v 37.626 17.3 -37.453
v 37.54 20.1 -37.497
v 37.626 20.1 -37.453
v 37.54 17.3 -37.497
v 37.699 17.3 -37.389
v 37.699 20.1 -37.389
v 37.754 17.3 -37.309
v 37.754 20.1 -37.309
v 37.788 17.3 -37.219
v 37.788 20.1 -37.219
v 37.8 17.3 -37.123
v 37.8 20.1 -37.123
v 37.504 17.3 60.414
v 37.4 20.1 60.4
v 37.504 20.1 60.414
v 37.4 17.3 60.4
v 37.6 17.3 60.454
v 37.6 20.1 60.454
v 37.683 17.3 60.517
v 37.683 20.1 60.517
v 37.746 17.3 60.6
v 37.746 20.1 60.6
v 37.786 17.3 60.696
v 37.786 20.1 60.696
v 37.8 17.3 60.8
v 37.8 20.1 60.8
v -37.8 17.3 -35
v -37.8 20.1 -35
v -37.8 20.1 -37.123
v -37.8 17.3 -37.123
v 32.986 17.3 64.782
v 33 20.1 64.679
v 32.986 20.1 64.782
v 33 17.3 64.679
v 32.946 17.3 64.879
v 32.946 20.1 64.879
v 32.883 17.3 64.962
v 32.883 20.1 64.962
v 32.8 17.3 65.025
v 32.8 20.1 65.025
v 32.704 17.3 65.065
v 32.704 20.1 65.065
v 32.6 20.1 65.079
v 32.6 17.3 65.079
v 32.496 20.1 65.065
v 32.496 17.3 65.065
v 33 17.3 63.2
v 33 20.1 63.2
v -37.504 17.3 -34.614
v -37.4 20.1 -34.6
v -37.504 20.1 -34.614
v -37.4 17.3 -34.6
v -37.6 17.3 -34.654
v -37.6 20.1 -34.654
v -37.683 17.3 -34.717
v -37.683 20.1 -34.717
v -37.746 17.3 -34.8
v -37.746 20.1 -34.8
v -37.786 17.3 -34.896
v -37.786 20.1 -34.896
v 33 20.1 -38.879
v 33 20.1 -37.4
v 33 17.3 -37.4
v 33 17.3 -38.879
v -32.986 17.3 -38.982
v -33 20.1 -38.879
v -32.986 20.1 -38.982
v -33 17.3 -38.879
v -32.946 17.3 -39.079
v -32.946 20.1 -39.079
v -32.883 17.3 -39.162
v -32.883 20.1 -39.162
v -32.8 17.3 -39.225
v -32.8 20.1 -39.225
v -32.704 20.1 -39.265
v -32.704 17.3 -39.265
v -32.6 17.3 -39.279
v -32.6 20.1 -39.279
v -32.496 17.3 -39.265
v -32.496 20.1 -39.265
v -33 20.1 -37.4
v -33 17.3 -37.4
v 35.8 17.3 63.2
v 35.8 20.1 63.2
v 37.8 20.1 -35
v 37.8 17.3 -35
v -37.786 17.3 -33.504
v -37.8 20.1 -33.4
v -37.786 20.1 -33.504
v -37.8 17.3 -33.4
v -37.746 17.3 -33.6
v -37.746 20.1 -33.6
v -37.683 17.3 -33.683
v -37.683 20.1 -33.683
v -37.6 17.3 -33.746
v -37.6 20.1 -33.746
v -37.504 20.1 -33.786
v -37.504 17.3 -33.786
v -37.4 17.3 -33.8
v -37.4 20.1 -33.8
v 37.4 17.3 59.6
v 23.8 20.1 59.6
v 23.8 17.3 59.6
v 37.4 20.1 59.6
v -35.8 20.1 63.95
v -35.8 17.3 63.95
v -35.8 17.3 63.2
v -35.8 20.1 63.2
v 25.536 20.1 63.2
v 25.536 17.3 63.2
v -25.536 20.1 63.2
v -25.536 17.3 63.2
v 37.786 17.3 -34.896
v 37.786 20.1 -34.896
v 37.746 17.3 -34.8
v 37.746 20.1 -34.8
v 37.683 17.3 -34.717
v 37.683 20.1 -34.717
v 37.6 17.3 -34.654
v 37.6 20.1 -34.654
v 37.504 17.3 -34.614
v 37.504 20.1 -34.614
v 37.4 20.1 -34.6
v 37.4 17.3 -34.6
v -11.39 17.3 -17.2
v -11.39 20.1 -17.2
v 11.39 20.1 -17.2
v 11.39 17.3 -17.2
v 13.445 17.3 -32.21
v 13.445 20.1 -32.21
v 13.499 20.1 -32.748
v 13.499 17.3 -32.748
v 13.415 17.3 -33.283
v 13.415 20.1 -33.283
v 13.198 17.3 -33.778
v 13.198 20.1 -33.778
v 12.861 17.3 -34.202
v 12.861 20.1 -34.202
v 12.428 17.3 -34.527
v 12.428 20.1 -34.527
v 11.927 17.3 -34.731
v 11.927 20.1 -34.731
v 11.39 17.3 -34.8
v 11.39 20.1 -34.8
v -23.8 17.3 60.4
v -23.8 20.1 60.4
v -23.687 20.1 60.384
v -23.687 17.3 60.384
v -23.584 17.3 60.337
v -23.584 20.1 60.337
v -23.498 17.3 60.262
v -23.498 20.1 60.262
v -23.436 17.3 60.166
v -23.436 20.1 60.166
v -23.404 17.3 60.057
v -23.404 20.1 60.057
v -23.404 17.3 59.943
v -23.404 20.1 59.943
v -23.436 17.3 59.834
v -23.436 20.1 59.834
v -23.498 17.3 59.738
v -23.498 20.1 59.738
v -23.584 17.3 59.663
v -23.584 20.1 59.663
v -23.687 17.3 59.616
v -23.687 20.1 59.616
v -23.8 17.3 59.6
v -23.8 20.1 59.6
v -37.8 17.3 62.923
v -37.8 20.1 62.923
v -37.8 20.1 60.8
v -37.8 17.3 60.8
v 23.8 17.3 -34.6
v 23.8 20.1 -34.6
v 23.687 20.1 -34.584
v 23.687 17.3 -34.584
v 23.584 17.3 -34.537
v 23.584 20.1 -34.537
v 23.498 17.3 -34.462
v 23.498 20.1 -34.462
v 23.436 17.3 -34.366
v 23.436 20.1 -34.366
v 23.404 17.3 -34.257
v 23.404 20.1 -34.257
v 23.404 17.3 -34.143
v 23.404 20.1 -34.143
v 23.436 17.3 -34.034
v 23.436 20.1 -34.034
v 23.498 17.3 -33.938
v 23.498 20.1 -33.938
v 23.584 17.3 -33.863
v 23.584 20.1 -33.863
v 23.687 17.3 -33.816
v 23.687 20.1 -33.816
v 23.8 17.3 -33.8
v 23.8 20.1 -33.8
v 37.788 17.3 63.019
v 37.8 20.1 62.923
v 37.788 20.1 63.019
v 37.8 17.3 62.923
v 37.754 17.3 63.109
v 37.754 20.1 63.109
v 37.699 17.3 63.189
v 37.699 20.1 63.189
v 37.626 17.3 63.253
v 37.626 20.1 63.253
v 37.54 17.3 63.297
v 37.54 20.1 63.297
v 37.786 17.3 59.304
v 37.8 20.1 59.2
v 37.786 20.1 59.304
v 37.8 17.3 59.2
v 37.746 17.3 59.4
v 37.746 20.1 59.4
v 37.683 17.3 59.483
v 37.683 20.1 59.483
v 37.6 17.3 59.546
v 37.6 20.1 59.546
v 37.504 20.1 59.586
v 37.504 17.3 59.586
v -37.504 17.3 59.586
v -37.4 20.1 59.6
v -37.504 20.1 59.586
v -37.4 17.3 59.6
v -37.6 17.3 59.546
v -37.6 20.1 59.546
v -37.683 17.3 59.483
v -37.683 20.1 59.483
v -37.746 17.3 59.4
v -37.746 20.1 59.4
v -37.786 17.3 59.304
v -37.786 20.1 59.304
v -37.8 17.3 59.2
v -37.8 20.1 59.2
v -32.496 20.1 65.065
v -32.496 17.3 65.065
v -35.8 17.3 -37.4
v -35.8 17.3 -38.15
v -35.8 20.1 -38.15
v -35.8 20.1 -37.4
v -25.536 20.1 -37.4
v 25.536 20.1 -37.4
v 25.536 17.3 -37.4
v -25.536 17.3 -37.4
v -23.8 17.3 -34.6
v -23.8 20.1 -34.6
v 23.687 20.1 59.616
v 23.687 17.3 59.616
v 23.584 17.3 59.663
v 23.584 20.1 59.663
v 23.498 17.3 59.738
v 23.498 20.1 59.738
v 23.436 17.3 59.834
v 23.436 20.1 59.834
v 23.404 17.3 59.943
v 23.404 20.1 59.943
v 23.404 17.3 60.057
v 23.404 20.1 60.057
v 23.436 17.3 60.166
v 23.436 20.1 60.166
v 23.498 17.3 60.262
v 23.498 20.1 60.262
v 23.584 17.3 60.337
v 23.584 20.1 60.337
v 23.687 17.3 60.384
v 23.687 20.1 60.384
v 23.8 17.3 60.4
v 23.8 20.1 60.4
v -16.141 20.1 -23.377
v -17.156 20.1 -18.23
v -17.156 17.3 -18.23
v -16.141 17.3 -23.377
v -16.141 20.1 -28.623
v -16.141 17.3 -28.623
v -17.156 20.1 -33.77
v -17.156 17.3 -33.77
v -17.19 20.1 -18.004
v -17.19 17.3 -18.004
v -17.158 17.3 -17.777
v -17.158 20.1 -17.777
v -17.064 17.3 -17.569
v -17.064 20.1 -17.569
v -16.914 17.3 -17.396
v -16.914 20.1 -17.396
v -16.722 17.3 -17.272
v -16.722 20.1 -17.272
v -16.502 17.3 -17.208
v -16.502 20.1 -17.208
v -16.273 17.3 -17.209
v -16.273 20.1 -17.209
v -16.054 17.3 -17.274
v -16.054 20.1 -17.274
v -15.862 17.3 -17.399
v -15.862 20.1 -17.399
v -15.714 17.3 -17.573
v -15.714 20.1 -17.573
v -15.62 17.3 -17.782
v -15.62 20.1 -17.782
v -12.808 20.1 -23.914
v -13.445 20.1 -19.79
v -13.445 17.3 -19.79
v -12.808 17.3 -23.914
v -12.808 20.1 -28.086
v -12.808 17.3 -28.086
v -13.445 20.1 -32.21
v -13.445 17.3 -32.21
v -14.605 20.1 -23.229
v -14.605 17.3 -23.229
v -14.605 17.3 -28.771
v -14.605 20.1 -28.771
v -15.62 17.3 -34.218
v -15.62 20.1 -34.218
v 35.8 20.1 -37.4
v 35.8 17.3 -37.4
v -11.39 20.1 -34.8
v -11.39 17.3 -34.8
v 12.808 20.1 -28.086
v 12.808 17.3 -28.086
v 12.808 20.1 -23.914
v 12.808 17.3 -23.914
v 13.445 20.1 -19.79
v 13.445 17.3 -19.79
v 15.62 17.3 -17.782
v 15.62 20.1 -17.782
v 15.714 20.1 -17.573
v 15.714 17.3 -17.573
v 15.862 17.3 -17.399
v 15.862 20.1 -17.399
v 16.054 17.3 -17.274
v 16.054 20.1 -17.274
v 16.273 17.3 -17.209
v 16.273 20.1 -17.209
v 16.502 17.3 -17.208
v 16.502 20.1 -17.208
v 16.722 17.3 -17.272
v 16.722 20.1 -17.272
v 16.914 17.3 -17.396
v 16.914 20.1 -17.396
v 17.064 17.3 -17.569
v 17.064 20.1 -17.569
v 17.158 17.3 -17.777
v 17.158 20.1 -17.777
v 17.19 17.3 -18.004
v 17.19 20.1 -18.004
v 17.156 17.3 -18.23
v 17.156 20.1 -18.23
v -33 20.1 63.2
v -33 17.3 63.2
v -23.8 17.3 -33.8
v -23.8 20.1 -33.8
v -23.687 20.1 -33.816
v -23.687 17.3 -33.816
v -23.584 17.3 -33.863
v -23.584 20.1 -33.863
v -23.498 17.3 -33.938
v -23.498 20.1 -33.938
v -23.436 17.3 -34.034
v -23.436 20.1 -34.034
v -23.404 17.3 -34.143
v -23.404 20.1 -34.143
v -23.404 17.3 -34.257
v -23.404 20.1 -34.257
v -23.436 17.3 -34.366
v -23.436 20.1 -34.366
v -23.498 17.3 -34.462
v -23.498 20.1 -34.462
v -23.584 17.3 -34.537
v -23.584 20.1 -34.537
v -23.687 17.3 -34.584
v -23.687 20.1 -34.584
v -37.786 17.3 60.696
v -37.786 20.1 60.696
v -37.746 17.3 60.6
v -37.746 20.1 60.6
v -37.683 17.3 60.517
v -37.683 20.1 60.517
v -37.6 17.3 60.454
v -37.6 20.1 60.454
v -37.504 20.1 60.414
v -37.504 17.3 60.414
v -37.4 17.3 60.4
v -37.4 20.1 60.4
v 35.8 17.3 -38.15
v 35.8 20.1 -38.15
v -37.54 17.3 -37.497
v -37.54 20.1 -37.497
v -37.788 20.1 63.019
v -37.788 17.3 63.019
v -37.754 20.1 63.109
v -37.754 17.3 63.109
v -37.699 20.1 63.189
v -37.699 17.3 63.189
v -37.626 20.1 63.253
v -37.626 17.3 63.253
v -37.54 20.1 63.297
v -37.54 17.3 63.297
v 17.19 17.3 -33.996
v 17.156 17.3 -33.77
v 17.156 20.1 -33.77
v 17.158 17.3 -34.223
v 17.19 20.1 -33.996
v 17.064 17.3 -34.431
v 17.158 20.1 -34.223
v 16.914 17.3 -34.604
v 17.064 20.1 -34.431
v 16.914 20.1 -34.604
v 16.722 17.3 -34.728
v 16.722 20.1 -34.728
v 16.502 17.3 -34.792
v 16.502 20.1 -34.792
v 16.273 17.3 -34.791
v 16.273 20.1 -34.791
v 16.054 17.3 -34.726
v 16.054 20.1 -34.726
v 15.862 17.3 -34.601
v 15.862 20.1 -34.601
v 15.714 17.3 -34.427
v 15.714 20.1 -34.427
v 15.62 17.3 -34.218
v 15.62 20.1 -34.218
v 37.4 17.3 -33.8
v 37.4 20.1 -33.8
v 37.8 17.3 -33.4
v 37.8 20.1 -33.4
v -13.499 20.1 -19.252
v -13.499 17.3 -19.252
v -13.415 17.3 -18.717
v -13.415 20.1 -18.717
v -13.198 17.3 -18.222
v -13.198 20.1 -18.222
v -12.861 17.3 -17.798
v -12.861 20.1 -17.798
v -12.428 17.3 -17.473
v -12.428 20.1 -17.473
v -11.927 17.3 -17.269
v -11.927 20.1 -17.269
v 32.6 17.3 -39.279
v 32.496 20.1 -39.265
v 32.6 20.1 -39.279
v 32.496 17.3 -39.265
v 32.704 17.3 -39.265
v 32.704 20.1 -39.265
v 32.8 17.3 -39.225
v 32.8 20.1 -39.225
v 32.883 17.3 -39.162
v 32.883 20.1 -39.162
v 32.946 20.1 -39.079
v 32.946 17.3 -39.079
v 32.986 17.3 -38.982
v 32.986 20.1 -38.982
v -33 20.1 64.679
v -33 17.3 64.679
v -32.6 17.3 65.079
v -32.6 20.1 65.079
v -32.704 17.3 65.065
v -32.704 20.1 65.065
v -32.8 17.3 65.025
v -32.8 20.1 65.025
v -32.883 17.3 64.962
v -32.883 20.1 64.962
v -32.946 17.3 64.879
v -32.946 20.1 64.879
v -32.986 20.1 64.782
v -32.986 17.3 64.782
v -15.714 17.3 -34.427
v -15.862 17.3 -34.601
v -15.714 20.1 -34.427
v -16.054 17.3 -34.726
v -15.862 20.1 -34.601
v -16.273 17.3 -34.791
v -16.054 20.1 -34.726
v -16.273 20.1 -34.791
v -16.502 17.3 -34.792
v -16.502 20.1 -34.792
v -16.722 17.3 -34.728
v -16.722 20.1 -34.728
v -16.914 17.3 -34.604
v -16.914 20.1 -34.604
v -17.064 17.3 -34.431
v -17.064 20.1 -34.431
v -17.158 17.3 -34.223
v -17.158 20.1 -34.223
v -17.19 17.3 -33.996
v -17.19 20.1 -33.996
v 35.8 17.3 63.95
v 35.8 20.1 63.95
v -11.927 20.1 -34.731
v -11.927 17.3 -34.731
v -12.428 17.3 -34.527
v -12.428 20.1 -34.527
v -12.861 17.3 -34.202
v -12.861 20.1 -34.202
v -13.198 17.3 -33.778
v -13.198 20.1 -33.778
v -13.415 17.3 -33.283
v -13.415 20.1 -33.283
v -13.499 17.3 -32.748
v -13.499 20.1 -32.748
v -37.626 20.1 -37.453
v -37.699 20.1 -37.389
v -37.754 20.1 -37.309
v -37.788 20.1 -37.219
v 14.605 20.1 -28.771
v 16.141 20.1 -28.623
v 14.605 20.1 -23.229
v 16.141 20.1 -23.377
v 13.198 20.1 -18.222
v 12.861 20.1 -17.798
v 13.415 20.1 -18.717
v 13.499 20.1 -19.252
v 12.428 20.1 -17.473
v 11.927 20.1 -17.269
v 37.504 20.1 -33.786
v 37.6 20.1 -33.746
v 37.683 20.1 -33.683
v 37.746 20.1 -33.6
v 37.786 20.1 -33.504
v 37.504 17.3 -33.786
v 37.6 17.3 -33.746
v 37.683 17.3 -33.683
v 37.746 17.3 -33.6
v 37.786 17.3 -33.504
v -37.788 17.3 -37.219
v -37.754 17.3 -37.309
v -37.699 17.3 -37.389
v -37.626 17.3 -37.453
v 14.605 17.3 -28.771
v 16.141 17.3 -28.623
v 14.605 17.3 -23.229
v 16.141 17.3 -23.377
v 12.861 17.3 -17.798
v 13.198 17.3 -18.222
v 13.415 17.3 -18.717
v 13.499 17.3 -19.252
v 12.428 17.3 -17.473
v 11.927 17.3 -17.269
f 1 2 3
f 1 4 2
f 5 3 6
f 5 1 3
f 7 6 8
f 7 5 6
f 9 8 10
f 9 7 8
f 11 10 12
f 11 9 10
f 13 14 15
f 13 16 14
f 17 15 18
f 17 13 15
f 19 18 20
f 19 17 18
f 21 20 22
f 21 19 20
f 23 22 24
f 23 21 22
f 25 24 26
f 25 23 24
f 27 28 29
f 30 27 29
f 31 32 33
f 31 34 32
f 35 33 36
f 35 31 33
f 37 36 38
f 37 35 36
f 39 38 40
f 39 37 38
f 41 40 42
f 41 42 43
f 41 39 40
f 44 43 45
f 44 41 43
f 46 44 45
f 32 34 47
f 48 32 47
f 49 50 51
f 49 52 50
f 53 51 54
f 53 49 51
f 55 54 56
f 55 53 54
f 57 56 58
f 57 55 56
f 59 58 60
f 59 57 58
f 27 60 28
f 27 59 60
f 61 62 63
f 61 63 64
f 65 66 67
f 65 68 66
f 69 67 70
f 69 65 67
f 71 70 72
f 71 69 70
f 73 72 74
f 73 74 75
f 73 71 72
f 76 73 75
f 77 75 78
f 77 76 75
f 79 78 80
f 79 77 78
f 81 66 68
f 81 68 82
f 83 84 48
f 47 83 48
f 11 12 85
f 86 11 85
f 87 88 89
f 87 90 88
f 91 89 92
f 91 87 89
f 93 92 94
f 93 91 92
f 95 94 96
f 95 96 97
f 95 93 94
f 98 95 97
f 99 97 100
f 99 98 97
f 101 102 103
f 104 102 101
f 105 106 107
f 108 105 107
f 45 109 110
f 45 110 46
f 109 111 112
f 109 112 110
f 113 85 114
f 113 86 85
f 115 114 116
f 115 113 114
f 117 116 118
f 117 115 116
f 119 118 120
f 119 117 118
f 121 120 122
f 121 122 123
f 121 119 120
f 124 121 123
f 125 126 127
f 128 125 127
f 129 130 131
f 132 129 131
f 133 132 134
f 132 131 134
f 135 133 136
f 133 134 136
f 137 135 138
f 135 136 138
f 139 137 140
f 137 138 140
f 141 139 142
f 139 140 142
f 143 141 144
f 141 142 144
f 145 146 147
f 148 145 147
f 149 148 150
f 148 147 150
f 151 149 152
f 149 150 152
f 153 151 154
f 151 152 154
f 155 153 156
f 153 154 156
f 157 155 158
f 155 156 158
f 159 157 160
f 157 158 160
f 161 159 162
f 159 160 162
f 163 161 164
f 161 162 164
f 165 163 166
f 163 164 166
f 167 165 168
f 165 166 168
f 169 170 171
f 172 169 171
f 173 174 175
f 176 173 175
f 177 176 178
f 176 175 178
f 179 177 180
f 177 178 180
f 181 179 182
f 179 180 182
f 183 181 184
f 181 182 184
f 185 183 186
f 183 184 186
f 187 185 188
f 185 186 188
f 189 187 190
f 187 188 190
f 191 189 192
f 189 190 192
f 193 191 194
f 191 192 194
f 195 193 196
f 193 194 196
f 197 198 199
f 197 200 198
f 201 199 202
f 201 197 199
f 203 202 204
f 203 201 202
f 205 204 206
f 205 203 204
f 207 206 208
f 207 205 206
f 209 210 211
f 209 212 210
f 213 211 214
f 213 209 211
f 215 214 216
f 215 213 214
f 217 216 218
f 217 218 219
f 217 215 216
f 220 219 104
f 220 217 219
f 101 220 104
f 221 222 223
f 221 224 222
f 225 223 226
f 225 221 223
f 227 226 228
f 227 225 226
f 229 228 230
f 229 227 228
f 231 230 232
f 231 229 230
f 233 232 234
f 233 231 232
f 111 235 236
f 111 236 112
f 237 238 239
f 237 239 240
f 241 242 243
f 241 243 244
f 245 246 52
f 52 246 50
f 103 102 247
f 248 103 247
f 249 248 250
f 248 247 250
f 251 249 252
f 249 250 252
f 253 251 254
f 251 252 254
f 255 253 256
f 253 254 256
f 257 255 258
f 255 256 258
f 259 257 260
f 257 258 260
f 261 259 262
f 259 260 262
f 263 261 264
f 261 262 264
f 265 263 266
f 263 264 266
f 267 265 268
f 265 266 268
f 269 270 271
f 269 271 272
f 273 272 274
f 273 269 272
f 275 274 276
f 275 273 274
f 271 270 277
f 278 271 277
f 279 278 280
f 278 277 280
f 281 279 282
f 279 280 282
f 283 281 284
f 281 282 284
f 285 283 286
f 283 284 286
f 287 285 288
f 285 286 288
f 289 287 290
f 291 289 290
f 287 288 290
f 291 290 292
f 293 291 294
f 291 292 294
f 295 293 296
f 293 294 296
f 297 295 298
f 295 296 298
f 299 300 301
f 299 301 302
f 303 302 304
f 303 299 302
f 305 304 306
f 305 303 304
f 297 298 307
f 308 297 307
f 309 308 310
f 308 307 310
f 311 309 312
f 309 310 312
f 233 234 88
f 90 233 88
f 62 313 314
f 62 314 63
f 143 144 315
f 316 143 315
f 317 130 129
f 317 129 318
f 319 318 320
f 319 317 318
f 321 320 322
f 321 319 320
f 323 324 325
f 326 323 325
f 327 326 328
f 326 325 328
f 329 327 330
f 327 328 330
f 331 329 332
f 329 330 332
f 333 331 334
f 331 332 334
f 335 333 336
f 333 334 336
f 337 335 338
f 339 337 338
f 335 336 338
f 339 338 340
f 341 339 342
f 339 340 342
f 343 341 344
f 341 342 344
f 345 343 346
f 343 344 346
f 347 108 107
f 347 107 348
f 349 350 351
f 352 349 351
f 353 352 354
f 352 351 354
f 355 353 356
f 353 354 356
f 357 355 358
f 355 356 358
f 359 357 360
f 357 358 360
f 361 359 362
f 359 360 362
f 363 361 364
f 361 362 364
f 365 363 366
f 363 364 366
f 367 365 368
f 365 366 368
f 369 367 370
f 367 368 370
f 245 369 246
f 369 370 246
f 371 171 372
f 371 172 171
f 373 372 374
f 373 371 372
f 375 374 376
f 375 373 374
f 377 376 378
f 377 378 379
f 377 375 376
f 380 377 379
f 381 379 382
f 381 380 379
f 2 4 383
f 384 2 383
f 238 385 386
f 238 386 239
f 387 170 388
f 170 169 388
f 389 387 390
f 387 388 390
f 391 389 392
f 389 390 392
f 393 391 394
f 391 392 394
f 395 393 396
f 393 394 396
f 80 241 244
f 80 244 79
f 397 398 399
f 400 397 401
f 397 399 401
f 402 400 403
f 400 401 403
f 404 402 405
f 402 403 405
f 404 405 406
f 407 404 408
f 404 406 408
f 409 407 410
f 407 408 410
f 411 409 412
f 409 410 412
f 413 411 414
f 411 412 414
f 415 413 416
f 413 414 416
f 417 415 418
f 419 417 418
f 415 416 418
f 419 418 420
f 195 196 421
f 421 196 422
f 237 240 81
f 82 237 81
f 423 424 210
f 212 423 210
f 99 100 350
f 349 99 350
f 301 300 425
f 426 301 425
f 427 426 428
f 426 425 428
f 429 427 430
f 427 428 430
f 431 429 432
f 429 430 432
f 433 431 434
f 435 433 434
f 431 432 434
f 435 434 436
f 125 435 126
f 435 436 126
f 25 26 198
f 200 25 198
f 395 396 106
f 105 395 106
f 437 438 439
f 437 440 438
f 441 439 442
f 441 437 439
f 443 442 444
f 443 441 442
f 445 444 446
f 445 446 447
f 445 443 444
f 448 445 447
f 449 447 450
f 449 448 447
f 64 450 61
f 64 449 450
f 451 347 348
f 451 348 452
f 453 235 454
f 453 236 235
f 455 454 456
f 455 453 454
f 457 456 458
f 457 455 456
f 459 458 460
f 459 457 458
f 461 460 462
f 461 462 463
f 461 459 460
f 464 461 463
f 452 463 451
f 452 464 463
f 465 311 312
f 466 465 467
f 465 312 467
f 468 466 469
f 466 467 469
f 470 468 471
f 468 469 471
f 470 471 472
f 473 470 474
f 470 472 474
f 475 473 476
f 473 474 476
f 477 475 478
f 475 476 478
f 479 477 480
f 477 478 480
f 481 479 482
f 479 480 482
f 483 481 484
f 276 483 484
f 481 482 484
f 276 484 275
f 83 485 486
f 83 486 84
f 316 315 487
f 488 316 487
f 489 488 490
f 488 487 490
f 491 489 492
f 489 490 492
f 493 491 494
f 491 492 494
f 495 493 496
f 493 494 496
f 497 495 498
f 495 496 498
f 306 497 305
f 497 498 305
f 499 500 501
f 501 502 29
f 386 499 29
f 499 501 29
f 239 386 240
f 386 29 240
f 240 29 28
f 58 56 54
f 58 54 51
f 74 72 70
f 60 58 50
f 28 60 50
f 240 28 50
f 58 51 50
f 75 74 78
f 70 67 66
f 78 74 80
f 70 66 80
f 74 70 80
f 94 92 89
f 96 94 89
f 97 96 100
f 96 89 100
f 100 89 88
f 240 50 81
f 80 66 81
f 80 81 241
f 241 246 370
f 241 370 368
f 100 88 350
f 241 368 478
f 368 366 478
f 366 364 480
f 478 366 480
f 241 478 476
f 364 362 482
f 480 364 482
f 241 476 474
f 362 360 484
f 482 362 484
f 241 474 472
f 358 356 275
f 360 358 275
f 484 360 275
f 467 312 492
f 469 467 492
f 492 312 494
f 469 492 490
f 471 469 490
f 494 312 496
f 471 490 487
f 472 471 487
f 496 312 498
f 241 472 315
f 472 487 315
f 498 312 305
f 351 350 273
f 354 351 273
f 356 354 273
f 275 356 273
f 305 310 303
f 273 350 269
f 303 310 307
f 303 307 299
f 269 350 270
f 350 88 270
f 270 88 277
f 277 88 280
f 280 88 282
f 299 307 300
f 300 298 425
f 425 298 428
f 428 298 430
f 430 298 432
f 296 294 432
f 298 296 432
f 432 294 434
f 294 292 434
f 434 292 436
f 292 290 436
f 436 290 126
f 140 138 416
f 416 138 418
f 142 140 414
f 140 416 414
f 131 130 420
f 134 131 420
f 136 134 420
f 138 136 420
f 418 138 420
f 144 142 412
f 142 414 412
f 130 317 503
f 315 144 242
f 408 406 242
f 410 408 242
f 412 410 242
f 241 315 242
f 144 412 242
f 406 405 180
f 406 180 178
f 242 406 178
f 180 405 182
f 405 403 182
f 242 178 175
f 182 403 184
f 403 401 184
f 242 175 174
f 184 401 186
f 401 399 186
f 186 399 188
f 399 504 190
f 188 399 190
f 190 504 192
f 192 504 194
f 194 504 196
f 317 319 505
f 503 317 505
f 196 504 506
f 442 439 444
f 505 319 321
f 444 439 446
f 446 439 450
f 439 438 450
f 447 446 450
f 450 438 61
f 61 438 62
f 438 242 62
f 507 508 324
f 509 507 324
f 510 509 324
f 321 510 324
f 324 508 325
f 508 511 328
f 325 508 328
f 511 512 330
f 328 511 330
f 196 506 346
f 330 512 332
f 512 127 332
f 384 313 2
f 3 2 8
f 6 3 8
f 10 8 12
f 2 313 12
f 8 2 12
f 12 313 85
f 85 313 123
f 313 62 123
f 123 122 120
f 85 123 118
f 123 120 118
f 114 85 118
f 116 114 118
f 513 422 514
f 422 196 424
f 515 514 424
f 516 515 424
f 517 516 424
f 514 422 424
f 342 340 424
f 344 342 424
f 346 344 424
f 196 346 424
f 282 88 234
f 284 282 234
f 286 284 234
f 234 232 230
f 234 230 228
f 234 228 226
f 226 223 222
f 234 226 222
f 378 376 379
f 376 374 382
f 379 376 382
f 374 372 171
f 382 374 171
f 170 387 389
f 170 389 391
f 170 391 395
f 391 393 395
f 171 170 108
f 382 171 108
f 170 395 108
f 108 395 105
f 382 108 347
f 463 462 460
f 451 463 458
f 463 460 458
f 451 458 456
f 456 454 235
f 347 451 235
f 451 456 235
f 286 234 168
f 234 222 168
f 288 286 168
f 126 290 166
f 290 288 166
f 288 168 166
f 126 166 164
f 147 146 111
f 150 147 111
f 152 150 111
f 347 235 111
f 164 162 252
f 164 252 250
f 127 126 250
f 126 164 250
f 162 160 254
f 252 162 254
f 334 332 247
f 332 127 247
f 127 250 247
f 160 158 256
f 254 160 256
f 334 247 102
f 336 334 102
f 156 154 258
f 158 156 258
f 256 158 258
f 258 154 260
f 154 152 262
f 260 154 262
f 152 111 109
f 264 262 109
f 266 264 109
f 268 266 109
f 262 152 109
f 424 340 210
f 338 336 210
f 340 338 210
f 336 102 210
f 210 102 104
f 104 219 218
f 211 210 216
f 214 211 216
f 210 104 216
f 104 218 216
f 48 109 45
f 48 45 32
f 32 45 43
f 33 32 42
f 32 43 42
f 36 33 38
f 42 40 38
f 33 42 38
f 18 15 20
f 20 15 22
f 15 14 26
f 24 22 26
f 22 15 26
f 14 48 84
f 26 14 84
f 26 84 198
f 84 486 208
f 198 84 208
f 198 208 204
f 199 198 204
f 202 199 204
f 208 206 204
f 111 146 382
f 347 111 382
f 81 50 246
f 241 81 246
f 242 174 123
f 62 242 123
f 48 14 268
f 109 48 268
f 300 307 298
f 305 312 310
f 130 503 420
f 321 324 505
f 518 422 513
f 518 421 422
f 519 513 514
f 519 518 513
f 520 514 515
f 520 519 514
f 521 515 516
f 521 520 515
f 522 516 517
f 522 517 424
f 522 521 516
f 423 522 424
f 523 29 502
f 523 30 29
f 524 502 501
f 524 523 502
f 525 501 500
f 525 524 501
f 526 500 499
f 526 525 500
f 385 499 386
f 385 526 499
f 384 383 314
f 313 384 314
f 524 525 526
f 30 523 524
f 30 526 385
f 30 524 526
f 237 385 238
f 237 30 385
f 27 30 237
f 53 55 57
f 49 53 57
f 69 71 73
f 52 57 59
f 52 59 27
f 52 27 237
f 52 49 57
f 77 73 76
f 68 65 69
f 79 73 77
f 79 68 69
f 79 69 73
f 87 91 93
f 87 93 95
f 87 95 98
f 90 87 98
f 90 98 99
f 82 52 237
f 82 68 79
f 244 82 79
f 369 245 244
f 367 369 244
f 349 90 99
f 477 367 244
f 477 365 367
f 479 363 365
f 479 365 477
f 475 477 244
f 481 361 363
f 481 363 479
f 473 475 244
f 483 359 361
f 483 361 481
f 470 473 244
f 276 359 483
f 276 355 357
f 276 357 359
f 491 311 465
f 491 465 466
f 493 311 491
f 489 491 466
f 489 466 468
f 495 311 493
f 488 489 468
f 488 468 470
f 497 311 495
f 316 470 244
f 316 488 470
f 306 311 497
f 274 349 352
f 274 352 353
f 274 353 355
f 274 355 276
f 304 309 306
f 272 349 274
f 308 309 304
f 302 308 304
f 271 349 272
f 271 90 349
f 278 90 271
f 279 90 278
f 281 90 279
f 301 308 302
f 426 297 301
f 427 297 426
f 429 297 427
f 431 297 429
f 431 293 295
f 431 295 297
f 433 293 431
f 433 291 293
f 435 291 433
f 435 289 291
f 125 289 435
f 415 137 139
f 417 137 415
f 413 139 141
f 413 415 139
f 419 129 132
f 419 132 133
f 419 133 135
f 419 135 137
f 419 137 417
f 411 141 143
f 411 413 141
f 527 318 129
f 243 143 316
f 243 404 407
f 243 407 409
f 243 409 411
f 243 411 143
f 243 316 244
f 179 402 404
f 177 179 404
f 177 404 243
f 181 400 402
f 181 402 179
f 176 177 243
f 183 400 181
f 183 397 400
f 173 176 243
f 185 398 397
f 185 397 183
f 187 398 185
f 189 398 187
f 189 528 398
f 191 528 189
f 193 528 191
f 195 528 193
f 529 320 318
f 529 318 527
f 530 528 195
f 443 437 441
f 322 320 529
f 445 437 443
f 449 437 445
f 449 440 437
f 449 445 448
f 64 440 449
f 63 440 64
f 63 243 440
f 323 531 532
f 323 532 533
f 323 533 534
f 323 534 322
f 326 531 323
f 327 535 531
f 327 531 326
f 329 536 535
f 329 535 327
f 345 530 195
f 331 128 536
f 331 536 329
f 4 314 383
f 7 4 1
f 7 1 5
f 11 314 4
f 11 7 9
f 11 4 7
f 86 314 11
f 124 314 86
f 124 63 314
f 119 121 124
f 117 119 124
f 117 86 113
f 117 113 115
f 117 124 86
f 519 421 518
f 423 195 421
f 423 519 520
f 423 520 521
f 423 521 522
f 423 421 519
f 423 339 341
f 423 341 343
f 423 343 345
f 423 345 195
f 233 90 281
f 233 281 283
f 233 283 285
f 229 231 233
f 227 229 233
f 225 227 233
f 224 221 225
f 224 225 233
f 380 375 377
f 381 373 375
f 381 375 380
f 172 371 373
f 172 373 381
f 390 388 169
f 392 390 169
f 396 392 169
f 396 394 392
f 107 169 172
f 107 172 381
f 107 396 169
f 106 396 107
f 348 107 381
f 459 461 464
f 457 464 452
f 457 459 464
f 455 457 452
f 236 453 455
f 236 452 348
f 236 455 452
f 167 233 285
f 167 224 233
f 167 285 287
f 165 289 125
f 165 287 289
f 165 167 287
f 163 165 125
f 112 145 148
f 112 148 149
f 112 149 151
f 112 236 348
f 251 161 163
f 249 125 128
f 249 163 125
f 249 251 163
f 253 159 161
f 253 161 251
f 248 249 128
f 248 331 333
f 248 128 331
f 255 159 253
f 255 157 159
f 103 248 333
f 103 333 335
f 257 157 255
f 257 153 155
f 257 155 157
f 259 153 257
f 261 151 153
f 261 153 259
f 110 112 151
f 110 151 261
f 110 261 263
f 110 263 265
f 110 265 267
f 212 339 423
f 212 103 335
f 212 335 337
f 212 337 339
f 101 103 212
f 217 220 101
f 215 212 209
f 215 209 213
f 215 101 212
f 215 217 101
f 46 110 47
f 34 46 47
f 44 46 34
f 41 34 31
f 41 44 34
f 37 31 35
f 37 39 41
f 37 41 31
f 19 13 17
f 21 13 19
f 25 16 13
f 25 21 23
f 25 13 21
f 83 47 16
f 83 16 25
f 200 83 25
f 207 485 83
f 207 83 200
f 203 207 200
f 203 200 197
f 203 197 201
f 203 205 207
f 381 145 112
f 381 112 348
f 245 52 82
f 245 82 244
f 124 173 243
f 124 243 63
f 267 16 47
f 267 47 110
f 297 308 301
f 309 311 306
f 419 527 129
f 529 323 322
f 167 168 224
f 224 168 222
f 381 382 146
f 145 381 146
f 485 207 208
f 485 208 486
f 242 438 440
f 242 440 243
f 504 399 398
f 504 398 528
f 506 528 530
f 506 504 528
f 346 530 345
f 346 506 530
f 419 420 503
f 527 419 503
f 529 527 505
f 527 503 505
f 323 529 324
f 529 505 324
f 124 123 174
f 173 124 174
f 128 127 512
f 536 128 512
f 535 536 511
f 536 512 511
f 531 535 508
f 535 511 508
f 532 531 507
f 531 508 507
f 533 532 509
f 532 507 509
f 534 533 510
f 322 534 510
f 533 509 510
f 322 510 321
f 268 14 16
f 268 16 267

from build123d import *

# Parameters (mm, degrees)
PAD008_DEPTH = 2.8
FILLET001_R  = 0.4
POCKET_DEPTH = 2.801


with BuildPart() as part:
    # Sketch008 (on Face4 of ShapeBinder007) → Pad008 (new body)
    with BuildSketch(Plane(origin=(0, 20.1, 0), x_dir=(-1, 0, 0), z_dir=(0, 1, 0))):
        with BuildLine():
            Line((37.8, 63.2), (37.8, 60.4))
            Line((37.8, 60.4), (23.8, 60.4))
            ThreePointArc((23.8, 60.4), (23.4, 60), (23.8, 59.6))
            Line((23.8, 59.6), (37.8, 59.6))
            Line((37.8, 59.6), (37.8, -33.8))
            Line((37.8, -33.8), (23.8, -33.8))
            ThreePointArc((23.8, -33.8), (23.4, -34.2), (23.8, -34.6))
            Line((23.8, -34.6), (37.8, -34.6))
            Line((37.8, -34.6), (37.8, -37.4))
            Line((37.8, -37.4), (35.8, -38.15))
            Line((35.8, -38.15), (35.8, -37.4))
            Line((35.8, -37.4), (33, -37.4))
            Line((33, -39.4), (33, -37.4))
            Line((25.535898, -37.4), (33, -39.4))
            Line((-25.535898, -37.4), (25.535898, -37.4))
            Line((-33, -39.4), (-25.535898, -37.4))
            Line((-33, -37.4), (-33, -39.4))
            Line((-35.8, -37.4), (-33, -37.4))
            Line((-35.8, -38.15), (-35.8, -37.4))
            Line((-37.8, -37.4), (-35.8, -38.15))
            Line((-37.8, -37.4), (-37.8, -34.6))
            Line((-37.8, -34.6), (-23.8, -34.6))
            ThreePointArc((-23.8, -34.6), (-23.4, -34.2), (-23.8, -33.8))
            Line((-23.8, -33.8), (-37.8, -33.8))
            Line((-37.8, -33.8), (-37.8, 59.6))
            Line((-23.8, 59.6), (-37.8, 59.6))
            ThreePointArc((-23.8, 59.6), (-23.4, 60), (-23.8, 60.4))
            Line((-37.8, 60.4), (-23.8, 60.4))
            Line((-37.8, 60.4), (-37.8, 63.2))
            Line((-37.8, 63.2), (-35.8, 63.95))
            Line((-35.8, 63.95), (-35.8, 63.2))
            Line((-35.8, 63.2), (-33, 63.2))
            Line((-33, 65.2), (-33, 63.2))
            Line((-25.535898, 63.2), (-33, 65.2))
            Line((25.535898, 63.2), (-25.535898, 63.2))
            Line((33, 65.2), (25.535898, 63.2))
            Line((33, 63.2), (33, 65.2))
            Line((35.8, 63.2), (33, 63.2))
            Line((35.8, 63.95), (35.8, 63.2))
            Line((37.8, 63.2), (35.8, 63.95))
        make_face()
    extrude(amount=-PAD008_DEPTH)

    # Fillet001
    fillet001_edges = [part.edges().sort_by_distance(p)[0] for p in [
        (-33, 18.7, 65.2),
        (-37.8, 18.7, 63.2),
        (-37.8, 18.7, 60.4),
        (-37.8, 18.7, 59.6),
        (-37.8, 18.7, -33.8),
        (-37.8, 18.7, -34.6),
        (-37.8, 18.7, -37.4),
        (-33, 18.7, -39.4),
        (33, 18.7, 65.2),
        (37.8, 18.7, 63.2),
        (37.8, 18.7, 60.4),
        (37.8, 18.7, 59.6),
        (37.8, 18.7, -33.8),
        (37.8, 18.7, -34.6),
        (37.8, 18.7, -37.4),
        (33, 18.7, -39.4),
    ]]
    fillet(fillet001_edges, radius=FILLET001_R)

    # Sketch029 (on Face2 of Fillet001) → Pocket (cut, through all)
    with BuildSketch(Plane(origin=(0, 20.1, 0), x_dir=(-1, 0, 0), z_dir=(0, 1, 0))):
        with BuildLine():
            Line((-11.39, -34.8), (11.39, -34.8))
            ThreePointArc((11.39, -34.8), (13.043156, -34.001173), (13.444572, -32.209549))
            ThreePointArc((13.444577, -19.790431), (12.728234, -25.99999), (13.444572, -32.209549))
            ThreePointArc((13.444577, -19.790431), (13.04315, -17.998819), (11.39, -17.2))
            Line((11.39, -17.2), (-11.39, -17.2))
            ThreePointArc((-11.39, -17.2), (-13.04315, -17.998819), (-13.444577, -19.790431))
            ThreePointArc((-13.444577, -32.209569), (-12.728234, -26), (-13.444577, -19.790431))
            ThreePointArc((-13.444577, -32.209569), (-13.04315, -34.001181), (-11.39, -34.8))
        make_face()
        with BuildLine():
            ThreePointArc((-15.62035, -17.781737), (-16.614302, -17.232088), (-17.156126, -18.230327))
            ThreePointArc((-17.156126, -33.769673), (-16.013455, -26), (-17.156126, -18.230327))
            ThreePointArc((-17.156126, -33.769673), (-16.614302, -34.767912), (-15.62035, -34.218263))
            ThreePointArc((-15.62035, -34.218263), (-14.477584, -26), (-15.62035, -17.781737))
        make_face()
        with BuildLine():
            ThreePointArc((17.156126, -18.230327), (16.614302, -17.232088), (15.62035, -17.781737))
            ThreePointArc((15.62035, -17.781737), (14.477584, -26), (15.62035, -34.218263))
            ThreePointArc((15.62035, -34.218263), (16.614302, -34.767912), (17.156126, -33.769673))
            ThreePointArc((17.156126, -18.230327), (16.013455, -26), (17.156126, -33.769673))
        make_face()
    extrude(amount=-POCKET_DEPTH, mode=Mode.SUBTRACT)


solid = part.part
